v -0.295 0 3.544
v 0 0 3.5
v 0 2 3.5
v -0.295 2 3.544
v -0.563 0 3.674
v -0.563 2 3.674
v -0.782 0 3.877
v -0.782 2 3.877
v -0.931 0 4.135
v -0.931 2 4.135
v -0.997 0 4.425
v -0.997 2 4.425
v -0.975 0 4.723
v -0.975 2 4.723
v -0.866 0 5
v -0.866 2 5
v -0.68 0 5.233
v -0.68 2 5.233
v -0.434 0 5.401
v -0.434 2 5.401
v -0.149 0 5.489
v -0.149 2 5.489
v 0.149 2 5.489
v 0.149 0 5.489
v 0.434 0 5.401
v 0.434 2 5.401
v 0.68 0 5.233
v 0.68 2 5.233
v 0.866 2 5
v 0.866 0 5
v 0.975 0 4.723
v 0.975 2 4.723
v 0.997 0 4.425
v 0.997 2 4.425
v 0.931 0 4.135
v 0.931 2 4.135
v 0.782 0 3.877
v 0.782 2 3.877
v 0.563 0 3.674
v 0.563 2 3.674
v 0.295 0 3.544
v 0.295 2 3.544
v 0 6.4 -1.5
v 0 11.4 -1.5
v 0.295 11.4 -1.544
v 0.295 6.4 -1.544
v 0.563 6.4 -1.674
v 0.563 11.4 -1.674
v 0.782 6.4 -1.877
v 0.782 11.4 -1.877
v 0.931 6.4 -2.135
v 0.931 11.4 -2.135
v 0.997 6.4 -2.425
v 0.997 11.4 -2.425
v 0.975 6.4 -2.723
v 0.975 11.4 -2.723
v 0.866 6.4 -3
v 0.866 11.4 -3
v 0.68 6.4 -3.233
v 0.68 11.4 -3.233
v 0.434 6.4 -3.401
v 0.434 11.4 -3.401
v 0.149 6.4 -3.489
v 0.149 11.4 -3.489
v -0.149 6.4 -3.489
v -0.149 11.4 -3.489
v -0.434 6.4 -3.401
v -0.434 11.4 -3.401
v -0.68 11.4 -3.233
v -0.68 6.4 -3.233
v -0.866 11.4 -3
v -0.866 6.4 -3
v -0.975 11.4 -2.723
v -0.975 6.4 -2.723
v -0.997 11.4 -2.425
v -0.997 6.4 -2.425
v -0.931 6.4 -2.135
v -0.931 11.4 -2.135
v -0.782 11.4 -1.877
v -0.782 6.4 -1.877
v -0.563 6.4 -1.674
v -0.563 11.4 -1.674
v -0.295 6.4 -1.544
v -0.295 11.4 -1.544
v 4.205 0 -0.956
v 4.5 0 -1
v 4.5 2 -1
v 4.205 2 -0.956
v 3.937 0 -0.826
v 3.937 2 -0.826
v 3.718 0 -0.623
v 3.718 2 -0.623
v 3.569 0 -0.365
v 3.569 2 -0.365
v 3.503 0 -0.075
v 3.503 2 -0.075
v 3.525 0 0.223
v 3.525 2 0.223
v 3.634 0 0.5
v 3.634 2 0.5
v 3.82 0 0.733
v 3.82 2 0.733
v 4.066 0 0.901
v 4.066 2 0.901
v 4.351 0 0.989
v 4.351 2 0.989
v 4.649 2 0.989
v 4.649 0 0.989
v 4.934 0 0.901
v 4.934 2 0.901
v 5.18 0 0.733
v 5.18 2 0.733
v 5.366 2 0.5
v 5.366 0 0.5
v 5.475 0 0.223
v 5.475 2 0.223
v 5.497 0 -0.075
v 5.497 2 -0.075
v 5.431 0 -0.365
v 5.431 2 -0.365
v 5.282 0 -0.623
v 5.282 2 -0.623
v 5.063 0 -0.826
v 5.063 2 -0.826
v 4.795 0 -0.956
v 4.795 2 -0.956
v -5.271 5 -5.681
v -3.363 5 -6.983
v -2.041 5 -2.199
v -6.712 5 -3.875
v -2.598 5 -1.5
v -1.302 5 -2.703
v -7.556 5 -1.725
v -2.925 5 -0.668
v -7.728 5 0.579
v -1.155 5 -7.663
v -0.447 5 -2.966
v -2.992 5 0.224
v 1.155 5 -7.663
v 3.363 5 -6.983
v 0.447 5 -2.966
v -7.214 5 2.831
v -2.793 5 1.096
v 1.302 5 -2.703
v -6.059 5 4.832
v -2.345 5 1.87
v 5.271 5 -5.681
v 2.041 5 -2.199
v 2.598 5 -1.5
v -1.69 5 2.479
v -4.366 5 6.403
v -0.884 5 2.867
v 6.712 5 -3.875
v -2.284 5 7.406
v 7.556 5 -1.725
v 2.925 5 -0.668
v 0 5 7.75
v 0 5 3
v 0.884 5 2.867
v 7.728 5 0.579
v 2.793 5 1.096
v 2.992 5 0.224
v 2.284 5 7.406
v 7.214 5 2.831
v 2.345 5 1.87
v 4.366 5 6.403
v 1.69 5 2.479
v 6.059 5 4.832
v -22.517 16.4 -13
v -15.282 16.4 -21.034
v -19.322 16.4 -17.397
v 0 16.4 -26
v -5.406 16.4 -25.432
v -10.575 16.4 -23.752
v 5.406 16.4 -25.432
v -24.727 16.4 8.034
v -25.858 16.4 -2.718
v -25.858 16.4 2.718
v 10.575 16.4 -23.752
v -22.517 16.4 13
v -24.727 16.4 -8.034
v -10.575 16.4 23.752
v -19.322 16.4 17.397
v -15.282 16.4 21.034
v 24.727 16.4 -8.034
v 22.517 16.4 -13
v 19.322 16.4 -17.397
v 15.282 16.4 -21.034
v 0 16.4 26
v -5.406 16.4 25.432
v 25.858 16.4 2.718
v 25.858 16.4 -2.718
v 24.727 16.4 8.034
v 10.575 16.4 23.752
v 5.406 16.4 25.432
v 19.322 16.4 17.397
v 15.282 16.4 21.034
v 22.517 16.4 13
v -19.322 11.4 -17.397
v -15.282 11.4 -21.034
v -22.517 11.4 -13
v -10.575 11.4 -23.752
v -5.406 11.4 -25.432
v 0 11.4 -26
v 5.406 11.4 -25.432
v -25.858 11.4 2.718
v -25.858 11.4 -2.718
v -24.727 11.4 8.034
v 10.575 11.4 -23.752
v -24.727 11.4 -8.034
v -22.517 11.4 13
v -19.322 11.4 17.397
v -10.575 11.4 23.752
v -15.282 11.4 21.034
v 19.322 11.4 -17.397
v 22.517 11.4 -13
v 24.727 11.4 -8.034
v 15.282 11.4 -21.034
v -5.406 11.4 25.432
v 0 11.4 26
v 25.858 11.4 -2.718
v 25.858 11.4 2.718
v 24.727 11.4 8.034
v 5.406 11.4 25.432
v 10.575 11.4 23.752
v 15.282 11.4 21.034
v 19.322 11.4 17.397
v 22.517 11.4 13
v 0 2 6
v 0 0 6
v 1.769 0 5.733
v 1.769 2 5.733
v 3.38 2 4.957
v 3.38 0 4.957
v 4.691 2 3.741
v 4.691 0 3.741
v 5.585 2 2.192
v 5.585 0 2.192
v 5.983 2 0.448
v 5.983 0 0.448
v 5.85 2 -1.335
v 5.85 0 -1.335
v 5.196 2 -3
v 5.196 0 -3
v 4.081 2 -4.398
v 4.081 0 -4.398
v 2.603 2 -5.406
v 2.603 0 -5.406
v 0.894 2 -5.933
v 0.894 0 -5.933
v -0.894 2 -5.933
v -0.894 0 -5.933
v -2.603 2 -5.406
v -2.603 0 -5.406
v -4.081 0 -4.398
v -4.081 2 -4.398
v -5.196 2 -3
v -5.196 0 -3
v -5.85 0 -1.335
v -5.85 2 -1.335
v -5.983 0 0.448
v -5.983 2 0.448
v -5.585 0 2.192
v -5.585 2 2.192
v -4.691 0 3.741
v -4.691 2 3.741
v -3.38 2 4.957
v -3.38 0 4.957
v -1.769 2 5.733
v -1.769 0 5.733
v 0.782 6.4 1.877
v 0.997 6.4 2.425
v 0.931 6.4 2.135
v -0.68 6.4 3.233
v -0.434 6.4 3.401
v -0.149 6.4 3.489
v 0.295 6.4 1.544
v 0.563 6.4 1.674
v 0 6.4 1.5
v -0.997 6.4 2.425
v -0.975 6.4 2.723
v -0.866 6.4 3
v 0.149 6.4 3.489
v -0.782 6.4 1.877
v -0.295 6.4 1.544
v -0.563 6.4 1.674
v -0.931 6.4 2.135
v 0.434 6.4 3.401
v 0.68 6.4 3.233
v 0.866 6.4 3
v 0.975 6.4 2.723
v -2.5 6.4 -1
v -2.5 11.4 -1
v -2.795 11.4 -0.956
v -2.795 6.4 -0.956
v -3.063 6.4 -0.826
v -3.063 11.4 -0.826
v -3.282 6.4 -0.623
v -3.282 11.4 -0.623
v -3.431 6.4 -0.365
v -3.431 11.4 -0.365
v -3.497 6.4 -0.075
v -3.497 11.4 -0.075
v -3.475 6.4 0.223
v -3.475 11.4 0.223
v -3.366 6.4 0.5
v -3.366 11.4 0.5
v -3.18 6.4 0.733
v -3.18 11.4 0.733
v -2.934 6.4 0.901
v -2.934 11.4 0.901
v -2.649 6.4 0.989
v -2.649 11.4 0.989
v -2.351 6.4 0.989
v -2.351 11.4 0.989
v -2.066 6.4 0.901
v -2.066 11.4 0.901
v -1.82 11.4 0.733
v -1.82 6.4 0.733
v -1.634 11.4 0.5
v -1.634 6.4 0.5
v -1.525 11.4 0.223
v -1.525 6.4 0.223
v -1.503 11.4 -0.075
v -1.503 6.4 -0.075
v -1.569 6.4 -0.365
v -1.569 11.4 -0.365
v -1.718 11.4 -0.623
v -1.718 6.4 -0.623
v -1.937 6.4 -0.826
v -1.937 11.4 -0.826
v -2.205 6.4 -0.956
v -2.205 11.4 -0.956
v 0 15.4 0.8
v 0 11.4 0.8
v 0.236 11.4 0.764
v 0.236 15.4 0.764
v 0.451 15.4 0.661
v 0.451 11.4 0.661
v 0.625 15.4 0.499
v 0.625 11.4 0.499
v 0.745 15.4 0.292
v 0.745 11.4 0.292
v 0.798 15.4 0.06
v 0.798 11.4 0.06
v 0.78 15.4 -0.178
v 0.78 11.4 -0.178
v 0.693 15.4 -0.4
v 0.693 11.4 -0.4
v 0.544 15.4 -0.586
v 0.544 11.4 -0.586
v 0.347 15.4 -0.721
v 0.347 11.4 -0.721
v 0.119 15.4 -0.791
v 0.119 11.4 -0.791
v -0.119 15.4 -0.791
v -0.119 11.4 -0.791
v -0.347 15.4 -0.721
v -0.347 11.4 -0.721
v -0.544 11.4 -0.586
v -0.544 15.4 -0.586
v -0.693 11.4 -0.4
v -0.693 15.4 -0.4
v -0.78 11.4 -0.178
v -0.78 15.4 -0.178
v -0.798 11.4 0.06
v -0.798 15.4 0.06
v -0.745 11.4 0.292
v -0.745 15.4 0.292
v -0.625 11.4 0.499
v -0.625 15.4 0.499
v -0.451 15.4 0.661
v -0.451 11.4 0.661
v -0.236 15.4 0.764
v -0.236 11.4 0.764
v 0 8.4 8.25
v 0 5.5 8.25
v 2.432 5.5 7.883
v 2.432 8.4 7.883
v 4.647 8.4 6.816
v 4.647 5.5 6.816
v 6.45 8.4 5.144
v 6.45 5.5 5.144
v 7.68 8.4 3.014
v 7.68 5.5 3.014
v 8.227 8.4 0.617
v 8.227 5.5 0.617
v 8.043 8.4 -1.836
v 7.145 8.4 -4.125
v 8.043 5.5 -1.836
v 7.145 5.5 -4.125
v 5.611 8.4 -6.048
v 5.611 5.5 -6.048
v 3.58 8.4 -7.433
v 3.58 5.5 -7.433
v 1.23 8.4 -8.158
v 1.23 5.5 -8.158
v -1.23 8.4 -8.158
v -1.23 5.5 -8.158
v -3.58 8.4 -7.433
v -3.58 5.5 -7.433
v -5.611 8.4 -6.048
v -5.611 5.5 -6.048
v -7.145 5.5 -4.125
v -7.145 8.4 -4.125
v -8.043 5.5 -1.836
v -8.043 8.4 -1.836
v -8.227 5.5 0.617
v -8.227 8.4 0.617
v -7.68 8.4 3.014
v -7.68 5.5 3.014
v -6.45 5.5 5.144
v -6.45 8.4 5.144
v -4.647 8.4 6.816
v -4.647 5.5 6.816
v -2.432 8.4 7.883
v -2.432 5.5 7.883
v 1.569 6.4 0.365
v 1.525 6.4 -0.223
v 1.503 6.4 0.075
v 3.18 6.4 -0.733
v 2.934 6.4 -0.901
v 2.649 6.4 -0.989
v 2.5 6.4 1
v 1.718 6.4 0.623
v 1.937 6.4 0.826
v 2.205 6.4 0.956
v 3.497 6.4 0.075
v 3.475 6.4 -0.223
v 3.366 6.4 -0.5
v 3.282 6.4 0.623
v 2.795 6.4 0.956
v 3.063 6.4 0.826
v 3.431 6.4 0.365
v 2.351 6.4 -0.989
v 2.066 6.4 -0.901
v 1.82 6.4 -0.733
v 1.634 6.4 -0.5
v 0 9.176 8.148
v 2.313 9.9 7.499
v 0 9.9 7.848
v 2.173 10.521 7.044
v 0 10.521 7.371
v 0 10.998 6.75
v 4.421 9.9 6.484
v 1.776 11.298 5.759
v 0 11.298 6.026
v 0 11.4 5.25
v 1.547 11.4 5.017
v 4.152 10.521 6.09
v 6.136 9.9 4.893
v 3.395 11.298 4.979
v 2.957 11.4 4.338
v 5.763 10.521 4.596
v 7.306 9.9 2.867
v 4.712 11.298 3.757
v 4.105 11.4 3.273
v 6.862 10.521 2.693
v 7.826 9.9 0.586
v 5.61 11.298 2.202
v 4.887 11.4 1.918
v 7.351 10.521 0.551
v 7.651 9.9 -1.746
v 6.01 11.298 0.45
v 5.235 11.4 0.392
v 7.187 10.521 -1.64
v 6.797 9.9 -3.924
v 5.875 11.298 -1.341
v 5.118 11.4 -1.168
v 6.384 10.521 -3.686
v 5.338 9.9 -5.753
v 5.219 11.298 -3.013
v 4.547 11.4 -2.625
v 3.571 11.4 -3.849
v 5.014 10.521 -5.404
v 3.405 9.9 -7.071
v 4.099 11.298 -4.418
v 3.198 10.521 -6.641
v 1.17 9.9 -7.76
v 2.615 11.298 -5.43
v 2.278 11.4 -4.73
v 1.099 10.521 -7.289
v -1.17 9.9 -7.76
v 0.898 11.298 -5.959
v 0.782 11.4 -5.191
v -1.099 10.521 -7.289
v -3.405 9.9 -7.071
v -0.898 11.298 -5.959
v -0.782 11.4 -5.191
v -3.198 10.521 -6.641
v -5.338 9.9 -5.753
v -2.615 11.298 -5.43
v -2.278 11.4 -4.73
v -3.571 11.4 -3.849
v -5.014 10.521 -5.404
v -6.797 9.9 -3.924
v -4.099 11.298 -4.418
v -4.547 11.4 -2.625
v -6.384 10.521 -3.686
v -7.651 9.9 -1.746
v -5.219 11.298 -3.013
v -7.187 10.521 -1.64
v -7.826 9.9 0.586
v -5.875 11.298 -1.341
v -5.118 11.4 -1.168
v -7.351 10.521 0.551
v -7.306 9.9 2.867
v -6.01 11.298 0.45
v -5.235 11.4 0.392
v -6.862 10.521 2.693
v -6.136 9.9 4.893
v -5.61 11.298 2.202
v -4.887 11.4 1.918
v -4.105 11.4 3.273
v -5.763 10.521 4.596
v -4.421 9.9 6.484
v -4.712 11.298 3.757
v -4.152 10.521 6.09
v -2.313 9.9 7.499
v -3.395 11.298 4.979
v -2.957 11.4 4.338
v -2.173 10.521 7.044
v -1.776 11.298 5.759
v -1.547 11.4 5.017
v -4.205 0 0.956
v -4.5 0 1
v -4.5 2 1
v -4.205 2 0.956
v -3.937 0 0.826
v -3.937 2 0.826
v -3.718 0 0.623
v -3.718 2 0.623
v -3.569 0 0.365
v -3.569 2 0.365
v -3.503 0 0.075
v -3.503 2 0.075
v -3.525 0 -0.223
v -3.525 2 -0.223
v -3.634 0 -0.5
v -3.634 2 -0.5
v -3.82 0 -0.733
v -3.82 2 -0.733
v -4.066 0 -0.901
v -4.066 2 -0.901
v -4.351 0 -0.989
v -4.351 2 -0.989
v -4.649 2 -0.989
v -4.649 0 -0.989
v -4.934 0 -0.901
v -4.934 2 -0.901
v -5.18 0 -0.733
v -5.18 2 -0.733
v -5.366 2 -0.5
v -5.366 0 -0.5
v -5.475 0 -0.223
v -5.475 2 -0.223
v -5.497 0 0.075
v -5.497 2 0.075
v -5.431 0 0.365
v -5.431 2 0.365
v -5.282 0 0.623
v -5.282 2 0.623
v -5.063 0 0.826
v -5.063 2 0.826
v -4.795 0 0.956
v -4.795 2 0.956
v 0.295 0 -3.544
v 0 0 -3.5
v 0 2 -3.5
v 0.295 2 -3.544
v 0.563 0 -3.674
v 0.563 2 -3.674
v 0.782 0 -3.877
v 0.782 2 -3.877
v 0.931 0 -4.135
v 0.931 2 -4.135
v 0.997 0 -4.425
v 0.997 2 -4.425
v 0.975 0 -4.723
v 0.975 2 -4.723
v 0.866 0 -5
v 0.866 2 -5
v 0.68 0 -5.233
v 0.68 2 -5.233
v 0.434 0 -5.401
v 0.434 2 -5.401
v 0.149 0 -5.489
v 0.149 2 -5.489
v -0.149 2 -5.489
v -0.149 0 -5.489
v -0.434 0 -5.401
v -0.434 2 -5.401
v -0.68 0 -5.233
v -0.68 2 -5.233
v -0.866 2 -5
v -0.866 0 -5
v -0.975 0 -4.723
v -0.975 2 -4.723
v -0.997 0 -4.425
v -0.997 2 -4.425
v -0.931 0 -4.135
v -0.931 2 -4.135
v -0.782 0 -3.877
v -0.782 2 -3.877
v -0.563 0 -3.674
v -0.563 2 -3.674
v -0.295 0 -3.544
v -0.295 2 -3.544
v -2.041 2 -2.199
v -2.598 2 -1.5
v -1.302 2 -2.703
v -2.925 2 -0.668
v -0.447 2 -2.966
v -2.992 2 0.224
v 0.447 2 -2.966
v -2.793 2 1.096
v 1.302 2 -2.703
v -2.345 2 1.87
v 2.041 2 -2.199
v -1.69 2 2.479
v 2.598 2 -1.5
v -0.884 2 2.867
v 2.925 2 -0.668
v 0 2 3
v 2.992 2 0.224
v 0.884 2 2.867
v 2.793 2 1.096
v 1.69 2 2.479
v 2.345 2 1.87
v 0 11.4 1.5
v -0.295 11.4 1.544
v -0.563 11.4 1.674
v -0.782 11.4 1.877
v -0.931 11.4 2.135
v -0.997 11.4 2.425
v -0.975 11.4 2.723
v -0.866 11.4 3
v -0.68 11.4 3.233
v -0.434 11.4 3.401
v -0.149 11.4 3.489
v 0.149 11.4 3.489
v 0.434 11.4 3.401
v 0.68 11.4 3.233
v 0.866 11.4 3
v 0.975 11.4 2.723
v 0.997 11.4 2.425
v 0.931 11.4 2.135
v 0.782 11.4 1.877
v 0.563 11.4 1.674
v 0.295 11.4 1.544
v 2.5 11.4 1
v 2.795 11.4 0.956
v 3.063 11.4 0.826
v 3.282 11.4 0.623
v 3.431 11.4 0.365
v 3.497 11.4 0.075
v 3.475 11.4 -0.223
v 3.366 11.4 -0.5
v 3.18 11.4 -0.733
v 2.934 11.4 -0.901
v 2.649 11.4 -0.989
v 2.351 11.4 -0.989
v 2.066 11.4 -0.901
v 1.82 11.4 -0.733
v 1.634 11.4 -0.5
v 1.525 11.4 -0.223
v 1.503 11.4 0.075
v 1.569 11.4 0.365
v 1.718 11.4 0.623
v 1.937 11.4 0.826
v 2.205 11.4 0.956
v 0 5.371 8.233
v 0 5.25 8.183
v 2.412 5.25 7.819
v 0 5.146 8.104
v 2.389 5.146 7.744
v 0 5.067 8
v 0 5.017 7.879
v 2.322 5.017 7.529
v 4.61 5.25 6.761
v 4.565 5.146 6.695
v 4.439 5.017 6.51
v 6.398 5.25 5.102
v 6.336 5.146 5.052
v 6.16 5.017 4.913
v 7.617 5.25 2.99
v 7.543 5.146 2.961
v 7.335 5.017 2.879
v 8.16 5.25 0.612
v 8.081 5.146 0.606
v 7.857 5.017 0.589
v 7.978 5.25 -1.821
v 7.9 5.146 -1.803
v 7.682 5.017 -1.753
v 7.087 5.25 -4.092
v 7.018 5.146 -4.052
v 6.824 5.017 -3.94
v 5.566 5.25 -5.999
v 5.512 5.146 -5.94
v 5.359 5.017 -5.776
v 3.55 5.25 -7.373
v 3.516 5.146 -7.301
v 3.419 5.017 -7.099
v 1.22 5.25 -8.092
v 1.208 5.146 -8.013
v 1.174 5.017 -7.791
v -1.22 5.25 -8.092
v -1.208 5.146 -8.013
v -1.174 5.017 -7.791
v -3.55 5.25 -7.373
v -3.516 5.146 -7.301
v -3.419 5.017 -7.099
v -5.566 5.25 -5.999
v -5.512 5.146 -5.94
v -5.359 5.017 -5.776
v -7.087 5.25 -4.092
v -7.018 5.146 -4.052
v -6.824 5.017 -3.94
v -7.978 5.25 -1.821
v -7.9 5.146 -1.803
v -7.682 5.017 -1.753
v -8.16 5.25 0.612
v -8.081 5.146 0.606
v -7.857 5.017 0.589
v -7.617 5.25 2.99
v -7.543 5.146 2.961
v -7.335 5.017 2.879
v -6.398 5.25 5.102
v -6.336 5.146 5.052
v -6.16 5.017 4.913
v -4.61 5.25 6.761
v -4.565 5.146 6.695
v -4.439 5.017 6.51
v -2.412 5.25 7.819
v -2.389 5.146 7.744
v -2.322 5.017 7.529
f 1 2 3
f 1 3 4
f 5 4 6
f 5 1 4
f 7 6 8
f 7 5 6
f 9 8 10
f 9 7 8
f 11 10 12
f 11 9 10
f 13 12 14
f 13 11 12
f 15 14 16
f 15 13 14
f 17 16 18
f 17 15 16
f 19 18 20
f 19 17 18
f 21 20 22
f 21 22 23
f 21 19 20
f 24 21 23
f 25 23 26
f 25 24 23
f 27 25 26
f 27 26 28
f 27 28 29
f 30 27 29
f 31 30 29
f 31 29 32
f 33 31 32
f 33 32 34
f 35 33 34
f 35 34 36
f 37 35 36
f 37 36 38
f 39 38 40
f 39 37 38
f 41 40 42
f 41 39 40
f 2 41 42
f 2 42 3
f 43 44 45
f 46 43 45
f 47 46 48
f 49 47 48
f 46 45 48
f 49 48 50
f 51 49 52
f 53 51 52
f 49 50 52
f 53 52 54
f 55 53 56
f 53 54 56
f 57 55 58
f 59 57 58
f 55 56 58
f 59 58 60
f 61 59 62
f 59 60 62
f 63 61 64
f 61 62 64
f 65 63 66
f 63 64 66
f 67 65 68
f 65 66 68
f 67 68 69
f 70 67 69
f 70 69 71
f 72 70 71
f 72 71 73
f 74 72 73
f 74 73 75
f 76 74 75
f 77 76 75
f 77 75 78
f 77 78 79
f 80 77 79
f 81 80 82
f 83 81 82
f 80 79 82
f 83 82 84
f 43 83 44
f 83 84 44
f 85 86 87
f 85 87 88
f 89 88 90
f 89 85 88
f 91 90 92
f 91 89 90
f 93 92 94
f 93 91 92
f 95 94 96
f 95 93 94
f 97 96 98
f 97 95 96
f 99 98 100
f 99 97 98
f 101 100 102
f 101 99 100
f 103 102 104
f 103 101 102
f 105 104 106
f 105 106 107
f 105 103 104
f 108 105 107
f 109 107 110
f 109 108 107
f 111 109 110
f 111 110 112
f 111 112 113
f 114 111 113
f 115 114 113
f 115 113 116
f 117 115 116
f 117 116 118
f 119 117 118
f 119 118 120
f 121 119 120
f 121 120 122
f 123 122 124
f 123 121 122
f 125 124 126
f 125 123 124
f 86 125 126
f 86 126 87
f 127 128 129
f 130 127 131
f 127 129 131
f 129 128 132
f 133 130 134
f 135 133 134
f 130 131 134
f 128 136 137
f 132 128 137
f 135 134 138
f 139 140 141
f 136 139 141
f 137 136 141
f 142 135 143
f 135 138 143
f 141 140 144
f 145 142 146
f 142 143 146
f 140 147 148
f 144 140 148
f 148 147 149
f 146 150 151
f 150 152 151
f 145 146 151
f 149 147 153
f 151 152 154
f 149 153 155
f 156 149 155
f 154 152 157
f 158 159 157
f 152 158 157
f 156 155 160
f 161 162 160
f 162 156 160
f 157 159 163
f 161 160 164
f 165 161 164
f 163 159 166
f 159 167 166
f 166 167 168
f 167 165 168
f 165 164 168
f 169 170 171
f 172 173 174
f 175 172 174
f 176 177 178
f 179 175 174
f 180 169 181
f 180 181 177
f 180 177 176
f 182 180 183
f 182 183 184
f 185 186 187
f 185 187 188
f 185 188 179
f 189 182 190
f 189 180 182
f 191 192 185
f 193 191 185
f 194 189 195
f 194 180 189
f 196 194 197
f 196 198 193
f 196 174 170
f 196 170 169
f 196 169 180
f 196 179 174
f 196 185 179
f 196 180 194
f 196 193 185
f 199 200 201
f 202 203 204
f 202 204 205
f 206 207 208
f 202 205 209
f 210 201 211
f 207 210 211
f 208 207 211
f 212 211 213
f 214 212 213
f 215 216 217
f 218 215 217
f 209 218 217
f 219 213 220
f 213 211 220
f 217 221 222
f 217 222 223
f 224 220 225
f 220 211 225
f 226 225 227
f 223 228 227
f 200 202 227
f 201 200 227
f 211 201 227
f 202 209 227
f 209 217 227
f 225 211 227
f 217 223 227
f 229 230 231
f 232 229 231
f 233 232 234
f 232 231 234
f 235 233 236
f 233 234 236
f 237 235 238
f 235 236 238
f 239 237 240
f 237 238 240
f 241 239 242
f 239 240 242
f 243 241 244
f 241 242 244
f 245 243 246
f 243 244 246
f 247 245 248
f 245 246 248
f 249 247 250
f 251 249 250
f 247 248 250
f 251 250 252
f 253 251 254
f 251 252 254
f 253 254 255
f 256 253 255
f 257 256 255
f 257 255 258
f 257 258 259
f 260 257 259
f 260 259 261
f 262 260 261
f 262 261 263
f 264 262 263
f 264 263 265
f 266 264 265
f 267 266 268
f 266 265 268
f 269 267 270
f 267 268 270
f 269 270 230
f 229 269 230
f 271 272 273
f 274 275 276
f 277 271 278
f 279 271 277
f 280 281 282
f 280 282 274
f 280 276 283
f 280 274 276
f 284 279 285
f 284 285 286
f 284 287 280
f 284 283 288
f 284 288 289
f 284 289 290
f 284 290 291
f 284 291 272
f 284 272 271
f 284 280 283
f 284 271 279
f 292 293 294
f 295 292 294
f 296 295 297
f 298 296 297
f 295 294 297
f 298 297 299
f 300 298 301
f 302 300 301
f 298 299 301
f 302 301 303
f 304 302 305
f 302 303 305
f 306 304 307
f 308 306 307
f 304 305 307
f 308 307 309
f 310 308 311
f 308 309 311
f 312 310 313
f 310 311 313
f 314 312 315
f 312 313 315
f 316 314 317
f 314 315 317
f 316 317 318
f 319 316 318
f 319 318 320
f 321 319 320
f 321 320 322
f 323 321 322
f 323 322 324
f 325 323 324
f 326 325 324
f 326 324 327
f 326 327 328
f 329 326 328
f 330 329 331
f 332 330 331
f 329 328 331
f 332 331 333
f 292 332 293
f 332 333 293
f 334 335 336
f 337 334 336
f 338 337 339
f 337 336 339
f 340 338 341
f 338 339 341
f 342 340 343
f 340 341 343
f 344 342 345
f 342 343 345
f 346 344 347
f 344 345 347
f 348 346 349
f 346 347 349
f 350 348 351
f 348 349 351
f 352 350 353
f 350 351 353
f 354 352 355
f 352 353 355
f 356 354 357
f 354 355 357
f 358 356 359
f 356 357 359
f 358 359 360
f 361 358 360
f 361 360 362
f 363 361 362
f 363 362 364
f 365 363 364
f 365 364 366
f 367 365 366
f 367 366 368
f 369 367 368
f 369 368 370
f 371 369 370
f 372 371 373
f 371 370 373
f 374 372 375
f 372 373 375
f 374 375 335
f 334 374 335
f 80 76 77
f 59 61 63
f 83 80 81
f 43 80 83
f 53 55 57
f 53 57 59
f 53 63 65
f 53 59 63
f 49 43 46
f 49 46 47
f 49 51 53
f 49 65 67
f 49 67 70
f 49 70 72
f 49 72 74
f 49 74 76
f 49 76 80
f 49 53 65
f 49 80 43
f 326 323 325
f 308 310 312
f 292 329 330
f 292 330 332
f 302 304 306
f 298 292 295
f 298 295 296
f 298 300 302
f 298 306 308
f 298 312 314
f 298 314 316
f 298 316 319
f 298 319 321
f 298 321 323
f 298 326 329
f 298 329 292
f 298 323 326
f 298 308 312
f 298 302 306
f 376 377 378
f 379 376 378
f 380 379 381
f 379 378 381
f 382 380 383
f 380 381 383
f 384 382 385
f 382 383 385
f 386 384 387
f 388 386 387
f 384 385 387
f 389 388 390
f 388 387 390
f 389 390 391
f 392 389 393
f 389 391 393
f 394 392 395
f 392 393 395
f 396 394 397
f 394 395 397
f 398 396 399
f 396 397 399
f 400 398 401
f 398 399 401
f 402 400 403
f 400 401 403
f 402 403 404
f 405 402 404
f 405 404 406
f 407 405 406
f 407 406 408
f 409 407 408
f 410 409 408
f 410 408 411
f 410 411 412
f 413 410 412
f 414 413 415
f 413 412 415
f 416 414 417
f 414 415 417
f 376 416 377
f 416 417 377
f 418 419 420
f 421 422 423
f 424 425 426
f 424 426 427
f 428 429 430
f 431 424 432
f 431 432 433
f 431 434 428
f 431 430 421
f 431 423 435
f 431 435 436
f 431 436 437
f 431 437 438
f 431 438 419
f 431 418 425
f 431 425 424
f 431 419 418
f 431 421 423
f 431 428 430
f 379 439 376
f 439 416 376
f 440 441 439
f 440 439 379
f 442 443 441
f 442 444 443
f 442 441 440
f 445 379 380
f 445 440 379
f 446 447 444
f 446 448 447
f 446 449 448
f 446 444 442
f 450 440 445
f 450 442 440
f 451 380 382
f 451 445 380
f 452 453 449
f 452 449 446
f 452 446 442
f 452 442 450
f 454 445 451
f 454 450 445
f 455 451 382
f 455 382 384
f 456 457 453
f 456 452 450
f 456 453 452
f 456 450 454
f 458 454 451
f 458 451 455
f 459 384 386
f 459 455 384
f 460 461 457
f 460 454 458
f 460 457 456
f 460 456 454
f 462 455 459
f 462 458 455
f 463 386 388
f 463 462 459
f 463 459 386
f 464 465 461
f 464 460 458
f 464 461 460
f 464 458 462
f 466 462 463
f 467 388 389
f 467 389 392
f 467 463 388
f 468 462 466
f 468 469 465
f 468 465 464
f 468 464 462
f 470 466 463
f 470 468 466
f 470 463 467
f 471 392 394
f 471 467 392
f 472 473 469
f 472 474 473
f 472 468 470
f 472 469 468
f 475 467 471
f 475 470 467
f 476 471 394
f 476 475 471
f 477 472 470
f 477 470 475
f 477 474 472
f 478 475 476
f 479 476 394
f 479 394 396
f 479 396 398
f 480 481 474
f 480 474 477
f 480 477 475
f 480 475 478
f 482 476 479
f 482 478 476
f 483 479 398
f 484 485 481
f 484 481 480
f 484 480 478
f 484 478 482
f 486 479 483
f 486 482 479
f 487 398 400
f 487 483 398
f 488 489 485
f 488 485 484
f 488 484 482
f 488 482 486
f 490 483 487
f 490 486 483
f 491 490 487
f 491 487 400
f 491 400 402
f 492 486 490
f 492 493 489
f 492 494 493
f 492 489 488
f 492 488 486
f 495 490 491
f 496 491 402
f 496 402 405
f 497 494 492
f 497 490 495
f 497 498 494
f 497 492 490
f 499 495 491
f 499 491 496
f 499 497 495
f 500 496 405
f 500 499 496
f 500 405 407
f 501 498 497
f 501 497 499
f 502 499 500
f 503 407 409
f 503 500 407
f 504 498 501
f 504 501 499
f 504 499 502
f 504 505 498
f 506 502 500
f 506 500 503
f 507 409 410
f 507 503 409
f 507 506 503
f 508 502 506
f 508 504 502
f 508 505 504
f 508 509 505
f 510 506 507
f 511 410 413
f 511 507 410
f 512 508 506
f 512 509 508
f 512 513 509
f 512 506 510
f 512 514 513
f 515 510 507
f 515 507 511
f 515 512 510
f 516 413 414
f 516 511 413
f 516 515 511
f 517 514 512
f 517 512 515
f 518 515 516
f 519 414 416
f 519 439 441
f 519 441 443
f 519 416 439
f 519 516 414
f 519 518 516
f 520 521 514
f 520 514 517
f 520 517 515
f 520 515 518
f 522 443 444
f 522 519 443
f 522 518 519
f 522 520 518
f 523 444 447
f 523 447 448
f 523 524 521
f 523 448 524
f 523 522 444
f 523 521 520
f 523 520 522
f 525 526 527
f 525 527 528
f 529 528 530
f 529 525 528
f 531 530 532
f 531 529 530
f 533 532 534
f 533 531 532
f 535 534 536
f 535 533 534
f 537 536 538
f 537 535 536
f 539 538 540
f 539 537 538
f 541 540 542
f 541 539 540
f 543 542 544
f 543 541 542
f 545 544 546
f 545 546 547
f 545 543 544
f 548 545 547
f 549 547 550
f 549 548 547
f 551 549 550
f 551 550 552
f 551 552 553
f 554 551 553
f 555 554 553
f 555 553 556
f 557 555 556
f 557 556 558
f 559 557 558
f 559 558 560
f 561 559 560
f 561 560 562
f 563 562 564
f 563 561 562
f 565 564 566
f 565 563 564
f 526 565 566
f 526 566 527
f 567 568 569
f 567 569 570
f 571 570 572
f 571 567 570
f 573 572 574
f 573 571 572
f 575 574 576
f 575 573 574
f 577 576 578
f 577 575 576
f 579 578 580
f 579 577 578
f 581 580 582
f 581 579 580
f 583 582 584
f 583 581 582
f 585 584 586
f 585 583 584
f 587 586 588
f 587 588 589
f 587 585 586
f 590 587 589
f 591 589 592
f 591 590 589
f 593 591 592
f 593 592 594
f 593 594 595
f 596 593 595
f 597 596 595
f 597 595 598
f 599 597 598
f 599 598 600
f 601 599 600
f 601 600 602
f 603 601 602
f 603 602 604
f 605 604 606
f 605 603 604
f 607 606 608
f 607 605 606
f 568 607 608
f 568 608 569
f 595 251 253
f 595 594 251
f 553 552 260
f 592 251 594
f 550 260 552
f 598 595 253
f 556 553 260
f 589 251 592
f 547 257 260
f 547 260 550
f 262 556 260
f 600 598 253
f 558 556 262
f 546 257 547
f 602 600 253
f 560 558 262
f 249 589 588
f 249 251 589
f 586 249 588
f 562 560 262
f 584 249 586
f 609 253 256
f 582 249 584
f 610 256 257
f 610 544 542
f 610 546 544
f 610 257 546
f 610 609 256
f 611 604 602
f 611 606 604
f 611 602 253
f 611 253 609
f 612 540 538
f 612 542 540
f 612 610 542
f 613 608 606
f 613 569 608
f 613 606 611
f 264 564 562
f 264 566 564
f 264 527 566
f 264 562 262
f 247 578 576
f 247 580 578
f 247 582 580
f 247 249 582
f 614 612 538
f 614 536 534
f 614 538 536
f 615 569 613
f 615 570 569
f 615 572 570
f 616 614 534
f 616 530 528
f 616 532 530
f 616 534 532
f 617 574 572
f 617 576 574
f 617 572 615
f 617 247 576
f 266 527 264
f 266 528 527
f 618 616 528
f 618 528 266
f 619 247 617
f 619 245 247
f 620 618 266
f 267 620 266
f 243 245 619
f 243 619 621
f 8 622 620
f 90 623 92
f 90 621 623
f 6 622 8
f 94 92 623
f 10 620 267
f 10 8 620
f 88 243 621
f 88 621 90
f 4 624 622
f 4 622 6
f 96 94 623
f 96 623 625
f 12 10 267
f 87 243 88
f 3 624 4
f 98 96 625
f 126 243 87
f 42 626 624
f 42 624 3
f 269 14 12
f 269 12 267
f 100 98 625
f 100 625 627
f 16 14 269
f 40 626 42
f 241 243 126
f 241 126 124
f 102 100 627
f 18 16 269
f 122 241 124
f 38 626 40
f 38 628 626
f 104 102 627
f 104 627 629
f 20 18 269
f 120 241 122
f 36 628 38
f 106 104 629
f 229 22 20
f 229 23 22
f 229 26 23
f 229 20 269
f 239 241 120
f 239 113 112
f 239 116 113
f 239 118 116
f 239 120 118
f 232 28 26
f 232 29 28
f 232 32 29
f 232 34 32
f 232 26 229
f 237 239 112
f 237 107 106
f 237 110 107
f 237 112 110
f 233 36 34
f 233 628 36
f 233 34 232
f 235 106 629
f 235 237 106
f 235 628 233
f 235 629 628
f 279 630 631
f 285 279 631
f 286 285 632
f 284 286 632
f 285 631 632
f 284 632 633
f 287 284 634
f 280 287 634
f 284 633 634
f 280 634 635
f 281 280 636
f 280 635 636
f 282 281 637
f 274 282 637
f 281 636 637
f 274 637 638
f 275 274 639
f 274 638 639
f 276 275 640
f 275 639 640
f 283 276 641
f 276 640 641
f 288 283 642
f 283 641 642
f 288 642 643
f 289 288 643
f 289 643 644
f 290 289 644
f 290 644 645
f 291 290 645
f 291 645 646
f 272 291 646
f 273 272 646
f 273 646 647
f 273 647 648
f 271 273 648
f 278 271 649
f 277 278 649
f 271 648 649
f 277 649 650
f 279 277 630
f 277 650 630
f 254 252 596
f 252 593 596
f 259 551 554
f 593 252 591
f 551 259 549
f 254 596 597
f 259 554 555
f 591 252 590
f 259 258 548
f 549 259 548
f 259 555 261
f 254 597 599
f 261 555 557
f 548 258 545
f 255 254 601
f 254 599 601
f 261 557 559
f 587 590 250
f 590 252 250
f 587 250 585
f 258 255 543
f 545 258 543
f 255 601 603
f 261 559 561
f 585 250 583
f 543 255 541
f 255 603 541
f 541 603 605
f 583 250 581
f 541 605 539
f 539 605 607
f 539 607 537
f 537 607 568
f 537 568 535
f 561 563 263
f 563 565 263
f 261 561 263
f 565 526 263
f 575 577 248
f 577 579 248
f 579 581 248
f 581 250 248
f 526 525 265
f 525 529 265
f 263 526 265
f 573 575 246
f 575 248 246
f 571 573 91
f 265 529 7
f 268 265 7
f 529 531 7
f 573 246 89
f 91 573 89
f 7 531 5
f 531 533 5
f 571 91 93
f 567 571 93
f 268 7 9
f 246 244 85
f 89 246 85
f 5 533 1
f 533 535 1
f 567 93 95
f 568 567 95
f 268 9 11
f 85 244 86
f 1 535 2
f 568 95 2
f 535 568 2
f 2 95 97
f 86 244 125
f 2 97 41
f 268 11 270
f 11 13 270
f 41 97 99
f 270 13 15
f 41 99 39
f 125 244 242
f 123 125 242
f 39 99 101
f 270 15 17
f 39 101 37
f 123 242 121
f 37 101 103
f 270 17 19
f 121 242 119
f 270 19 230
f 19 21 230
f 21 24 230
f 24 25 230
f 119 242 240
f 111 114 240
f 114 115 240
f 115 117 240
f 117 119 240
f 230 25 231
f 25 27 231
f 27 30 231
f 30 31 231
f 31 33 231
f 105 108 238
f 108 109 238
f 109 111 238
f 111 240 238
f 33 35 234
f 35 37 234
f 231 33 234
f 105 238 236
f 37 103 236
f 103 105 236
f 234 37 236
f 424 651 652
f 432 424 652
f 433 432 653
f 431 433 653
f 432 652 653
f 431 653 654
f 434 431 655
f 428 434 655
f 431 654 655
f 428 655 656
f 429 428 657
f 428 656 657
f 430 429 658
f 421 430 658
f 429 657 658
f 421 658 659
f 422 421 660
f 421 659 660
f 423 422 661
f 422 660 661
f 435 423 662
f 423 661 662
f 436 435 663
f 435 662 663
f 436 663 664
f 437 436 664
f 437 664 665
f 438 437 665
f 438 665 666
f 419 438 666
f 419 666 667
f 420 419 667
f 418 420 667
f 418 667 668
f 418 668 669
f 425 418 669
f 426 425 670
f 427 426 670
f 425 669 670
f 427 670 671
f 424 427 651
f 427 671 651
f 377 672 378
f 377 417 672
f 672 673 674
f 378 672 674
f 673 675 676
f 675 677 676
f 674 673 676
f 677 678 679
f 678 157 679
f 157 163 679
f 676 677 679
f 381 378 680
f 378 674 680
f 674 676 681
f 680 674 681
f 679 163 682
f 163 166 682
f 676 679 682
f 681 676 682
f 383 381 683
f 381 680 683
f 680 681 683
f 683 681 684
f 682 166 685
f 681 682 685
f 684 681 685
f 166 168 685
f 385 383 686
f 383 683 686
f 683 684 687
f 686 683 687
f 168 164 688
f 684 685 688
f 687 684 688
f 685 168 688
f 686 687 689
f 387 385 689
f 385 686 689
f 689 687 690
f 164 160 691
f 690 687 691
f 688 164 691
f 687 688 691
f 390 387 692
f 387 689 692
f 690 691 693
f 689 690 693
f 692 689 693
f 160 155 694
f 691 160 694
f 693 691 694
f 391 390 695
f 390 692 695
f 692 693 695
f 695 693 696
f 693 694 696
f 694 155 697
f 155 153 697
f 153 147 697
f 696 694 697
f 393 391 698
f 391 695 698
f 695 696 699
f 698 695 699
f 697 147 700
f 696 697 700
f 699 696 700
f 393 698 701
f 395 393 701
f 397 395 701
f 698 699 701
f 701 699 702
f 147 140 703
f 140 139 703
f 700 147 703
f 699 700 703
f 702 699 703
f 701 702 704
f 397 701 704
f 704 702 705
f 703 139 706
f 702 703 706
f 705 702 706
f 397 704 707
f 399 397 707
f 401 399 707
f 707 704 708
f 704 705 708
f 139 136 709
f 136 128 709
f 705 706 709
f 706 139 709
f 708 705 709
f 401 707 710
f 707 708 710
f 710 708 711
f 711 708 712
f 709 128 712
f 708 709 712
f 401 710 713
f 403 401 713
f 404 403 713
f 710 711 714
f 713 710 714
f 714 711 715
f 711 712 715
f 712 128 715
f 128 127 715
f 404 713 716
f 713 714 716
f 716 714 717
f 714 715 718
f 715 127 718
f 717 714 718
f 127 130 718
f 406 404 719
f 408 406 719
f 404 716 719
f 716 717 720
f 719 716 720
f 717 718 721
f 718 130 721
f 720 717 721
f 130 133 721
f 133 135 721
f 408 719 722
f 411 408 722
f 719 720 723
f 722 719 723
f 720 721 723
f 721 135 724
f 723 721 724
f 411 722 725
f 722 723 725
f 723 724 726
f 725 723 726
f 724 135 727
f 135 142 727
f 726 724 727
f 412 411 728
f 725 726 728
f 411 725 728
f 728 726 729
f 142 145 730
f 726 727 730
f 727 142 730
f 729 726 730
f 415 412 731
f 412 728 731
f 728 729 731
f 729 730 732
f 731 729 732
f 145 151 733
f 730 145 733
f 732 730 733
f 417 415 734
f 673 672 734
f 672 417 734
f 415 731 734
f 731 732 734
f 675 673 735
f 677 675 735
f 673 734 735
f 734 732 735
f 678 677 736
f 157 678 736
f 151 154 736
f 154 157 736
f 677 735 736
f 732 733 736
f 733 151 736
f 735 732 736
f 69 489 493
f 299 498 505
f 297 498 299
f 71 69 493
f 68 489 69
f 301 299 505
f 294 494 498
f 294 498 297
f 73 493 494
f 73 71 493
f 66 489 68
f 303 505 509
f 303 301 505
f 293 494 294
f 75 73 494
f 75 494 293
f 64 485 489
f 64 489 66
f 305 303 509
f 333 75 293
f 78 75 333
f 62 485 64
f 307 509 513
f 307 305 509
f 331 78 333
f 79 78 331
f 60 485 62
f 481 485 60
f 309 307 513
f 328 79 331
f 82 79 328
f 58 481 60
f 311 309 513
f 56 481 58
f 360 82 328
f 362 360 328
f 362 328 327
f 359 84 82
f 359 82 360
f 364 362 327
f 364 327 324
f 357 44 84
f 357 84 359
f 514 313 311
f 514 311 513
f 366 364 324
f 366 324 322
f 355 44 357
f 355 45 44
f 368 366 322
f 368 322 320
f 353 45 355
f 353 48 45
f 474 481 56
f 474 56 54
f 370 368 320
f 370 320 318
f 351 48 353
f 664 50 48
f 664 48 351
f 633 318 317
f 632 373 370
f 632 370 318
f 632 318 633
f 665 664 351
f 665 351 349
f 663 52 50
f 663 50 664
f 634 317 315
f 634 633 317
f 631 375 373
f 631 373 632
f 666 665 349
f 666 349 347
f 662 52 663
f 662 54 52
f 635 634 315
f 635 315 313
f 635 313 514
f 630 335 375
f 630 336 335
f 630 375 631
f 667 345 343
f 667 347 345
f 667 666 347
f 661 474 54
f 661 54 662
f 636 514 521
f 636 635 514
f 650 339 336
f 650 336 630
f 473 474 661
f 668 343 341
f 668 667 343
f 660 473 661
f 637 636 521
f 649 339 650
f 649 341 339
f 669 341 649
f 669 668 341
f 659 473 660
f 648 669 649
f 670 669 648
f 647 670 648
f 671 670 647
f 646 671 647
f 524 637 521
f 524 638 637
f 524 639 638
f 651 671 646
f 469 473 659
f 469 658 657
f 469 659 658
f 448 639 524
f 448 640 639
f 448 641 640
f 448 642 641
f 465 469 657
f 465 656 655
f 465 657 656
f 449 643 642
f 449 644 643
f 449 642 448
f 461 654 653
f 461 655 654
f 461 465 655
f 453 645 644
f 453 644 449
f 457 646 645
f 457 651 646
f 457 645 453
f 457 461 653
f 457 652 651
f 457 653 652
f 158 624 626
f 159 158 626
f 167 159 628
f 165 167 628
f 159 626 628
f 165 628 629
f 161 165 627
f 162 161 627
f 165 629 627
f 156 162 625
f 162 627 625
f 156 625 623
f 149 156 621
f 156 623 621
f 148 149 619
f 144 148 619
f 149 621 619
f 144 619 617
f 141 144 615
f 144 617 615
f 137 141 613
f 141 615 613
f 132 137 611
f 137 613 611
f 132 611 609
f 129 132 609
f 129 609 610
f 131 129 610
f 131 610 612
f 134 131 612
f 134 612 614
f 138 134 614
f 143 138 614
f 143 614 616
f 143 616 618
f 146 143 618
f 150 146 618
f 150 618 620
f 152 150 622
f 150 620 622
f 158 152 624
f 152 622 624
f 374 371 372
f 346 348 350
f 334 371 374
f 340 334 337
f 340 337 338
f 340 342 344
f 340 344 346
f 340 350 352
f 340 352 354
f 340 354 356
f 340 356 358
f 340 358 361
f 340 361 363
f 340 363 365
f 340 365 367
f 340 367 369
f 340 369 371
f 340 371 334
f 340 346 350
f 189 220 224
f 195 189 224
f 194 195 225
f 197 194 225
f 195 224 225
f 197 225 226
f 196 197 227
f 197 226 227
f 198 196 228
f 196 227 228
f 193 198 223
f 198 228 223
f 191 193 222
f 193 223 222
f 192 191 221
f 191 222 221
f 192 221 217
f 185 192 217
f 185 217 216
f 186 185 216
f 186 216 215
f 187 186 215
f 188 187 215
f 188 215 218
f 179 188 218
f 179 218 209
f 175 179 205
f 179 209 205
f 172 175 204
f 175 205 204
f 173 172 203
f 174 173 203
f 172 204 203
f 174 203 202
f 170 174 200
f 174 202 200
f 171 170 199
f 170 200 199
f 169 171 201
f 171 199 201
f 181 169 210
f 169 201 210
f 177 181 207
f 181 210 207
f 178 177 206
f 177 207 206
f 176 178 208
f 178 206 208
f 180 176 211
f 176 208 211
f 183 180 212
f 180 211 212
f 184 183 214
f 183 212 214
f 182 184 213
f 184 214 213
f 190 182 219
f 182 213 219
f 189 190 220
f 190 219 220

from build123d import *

# Parameters (mm, degrees)
SKETCH_2_R          = 6
SKETCH_2_R_2        = 1
EXTRUDE_1_DEPTH     = 2
SKETCH_3_R          = 3
EXTRUDE_2_DEPTH     = 3
SKETCH_4_R          = 8.25
EXTRUDE_3_DEPTH     = 6.4
FILLET_1_R          = 3
FILLET_2_R          = 0.5
SKETCH_5_R          = 1
CUT_EXTRUDE_3_DEPTH = 5
SKETCH_7_R          = 0.8
EXTRUDE_5_DEPTH     = 4
SKETCH_6_R          = 26
EXTRUDE_4_DEPTH     = 5


with BuildPart() as part:
    # 草图2 → 凸台-拉伸1 (new body)
    with BuildSketch(Plane(origin=(0, 0, 0), x_dir=(1, 0, 0), z_dir=(0, 1, 0))):
        with Locations(Location((0, 0, 0), (0, 0, 270))):
            Circle(SKETCH_2_R)
        with Locations(Location((0, 4.5, 0), (0, 0, 270))):
            Circle(SKETCH_2_R_2, mode=Mode.SUBTRACT)
        with Locations(Location((-4.5, 0, 0), (0, 0, 270))):
            Circle(SKETCH_2_R_2, mode=Mode.SUBTRACT)
        with Locations(Location((0, -4.5, 0), (0, 0, 90))):
            Circle(SKETCH_2_R_2, mode=Mode.SUBTRACT)
        with Locations(Location((4.5, 0, 0), (0, 0, 90))):
            Circle(SKETCH_2_R_2, mode=Mode.SUBTRACT)
    extrude(amount=EXTRUDE_1_DEPTH)

    # 草图3 → 凸台-拉伸2 (add)
    with BuildSketch(Plane(origin=(0, 2, 0), x_dir=(1, 0, 0), z_dir=(0, 1, 0))):
        with Locations(Location((0, 0, 0), (0, 0, 270))):
            Circle(SKETCH_3_R)
    extrude(amount=EXTRUDE_2_DEPTH)

    # 草图4 → 凸台-拉伸3 (add)
    with BuildSketch(Plane(origin=(0, 5, 0), x_dir=(1, 0, 0), z_dir=(0, 1, 0))):
        with Locations(Location((0, 0, 0), (0, 0, 270))):
            Circle(SKETCH_4_R)
    extrude(amount=EXTRUDE_3_DEPTH)

    # 圆角1
    fillet_1_edges = [part.edges().sort_by_distance(p)[0] for p in [
        (0, 11.4, -8.25),
    ]]
    fillet(fillet_1_edges, radius=FILLET_1_R)

    # 圆角2
    fillet_2_edges = [part.edges().sort_by_distance(p)[0] for p in [
        (0, 5, -8.25),
    ]]
    fillet(fillet_2_edges, radius=FILLET_2_R)

    # 草图5 → 切除-拉伸3 (cut)
    with BuildSketch(Plane(origin=(0, 11.4, 0), x_dir=(1, 0, 0), z_dir=(0, 1, 0))):
        with Locations(Location((0, 2.5, 0), (0, 0, 270))):
            Circle(SKETCH_5_R)
        with Locations(Location((2.5, 0, 0), (0, 0, 270))):
            Circle(SKETCH_5_R)
        with Locations(Location((0, -2.5, 0), (0, 0, 90))):
            Circle(SKETCH_5_R)
        with Locations(Location((-2.5, 0, 0), (0, 0, 90))):
            Circle(SKETCH_5_R)
    extrude(amount=-CUT_EXTRUDE_3_DEPTH, mode=Mode.SUBTRACT)

    # 草图7 → 凸台-拉伸5 (add)
    with BuildSketch(Plane(origin=(0, 11.4, 0), x_dir=(1, 0, 0), z_dir=(0, 1, 0))):
        with Locations(Location((0, 0, 0), (0, 0, 270))):
            Circle(SKETCH_7_R)
    extrude(amount=EXTRUDE_5_DEPTH)


with BuildPart() as body_2:
    # 草图6 → 凸台-拉伸4 (new body)
    with BuildSketch(Plane(origin=(0, 11.4, 0), x_dir=(1, 0, 0), z_dir=(0, 1, 0))):
        with Locations(Location((0, 0, 0), (0, 0, 270))):
            Circle(SKETCH_6_R)
    extrude(amount=EXTRUDE_4_DEPTH)


solid = Compound([part.part, body_2.part])
